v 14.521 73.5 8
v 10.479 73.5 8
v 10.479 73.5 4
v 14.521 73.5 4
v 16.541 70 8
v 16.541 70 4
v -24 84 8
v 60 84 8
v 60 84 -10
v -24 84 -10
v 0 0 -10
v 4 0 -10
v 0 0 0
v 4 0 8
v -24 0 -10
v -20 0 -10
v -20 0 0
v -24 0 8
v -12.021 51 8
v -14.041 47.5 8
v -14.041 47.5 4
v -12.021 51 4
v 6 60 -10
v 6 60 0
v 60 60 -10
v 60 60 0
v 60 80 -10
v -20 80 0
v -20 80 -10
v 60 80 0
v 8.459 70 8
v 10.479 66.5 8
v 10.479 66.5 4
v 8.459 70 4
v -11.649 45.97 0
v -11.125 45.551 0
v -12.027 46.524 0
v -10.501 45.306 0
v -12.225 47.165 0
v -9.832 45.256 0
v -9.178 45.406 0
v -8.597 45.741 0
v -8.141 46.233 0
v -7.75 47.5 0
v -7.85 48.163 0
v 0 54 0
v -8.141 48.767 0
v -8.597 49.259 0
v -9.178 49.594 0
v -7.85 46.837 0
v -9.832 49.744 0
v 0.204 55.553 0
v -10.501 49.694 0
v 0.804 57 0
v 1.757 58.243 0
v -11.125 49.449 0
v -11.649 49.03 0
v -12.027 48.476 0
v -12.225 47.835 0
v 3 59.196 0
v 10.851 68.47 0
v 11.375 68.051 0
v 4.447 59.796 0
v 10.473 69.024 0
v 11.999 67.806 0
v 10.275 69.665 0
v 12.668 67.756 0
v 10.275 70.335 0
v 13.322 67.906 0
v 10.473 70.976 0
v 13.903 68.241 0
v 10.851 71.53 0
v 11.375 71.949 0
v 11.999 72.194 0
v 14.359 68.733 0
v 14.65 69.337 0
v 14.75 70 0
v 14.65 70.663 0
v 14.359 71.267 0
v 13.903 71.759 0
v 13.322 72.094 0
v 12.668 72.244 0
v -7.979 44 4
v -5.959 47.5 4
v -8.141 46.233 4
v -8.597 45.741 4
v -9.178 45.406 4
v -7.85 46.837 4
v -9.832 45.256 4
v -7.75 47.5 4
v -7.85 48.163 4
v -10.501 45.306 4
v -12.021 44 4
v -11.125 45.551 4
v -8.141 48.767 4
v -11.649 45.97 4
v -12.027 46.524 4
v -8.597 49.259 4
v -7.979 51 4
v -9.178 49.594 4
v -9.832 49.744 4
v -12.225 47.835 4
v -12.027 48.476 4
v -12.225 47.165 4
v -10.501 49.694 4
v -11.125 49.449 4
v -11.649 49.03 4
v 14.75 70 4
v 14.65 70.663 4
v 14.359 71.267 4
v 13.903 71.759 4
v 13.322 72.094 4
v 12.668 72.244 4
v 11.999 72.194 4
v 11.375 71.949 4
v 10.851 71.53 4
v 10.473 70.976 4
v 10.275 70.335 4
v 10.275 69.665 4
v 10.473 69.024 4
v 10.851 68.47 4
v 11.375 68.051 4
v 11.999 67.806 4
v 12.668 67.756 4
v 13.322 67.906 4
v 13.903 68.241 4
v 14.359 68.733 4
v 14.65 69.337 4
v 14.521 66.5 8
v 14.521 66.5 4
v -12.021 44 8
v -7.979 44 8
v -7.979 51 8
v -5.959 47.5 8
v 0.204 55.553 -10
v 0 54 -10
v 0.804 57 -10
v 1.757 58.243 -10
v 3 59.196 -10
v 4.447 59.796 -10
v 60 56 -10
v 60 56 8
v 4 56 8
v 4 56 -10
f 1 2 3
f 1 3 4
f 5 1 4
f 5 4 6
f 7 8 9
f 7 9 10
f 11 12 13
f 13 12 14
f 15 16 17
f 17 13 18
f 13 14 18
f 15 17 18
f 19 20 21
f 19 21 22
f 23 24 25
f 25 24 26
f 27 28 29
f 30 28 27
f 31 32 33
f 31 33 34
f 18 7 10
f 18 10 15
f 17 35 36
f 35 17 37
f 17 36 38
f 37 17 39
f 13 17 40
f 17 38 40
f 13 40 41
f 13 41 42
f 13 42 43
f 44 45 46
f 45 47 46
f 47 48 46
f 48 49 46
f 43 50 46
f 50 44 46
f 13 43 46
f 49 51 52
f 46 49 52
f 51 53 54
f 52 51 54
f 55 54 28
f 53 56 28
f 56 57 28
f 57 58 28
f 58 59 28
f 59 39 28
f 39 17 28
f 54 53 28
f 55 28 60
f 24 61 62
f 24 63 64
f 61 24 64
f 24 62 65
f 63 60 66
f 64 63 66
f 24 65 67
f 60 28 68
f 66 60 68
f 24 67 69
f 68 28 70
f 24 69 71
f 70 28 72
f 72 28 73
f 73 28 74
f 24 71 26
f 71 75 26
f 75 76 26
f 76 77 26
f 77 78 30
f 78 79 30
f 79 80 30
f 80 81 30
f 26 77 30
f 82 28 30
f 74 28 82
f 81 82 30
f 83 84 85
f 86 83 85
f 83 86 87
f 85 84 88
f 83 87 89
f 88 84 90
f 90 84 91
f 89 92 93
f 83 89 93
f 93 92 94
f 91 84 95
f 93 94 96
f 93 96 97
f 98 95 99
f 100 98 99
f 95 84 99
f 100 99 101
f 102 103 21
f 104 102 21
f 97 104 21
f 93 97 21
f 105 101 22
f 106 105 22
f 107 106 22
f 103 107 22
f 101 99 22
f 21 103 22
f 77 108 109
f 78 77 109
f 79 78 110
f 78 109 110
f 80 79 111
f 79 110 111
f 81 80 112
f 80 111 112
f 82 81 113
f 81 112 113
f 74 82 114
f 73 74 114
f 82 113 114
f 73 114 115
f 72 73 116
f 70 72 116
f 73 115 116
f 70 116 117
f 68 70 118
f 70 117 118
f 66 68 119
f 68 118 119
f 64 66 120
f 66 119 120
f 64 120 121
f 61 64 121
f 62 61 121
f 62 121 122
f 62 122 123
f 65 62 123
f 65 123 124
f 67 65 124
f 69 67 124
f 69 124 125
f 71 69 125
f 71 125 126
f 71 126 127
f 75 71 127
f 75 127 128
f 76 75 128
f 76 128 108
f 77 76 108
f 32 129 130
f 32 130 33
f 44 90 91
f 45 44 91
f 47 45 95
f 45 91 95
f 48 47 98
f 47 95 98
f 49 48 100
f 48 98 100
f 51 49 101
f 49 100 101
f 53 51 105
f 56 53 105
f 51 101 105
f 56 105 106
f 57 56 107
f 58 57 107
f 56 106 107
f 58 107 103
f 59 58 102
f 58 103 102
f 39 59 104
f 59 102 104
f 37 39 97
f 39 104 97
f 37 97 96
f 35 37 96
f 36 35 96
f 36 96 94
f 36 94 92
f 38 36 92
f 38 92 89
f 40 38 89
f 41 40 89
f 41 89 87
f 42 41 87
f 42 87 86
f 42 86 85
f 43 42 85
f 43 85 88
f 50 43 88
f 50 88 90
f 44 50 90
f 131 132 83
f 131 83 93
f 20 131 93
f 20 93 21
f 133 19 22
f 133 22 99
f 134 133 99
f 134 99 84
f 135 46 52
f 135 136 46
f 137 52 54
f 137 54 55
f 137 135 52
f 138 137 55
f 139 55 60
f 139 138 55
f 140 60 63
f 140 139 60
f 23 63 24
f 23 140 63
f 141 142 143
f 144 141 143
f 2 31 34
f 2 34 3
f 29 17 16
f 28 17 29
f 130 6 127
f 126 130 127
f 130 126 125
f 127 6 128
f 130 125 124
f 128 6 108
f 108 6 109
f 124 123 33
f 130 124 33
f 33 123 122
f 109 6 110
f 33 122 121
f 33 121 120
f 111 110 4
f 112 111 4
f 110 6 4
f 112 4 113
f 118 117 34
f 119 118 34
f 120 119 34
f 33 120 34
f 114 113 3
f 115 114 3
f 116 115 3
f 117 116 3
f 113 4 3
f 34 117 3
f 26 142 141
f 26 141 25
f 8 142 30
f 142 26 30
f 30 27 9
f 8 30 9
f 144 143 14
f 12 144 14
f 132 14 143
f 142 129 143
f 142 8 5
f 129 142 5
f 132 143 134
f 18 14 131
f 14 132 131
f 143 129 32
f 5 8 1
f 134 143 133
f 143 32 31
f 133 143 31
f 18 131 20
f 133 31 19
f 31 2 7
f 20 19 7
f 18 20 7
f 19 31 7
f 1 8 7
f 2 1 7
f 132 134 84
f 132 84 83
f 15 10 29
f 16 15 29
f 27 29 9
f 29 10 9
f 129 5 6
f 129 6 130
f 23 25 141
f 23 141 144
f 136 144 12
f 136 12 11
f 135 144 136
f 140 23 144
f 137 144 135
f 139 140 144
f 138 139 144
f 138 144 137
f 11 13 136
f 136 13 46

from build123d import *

# Parameters (mm, degrees)
BOSS_EXTRU_1_DEPTH      = 8
ENL_V_MAT_EXTRU_1_DEPTH = 4
ESQUISSE3_R             = 2.25
ENL_V_MAT_EXTRU_2_DEPTH = 5
BOSS_EXTRU_2_DEPTH      = 18
CONG_1_R                = 6


with BuildPart() as part:
    # Esquisse1 → Boss.-Extru.1 (new body)
    with BuildSketch(Plane.XY):
        Polygon((0, 0), (0, 60), (60, 60), (60, 80), (-20, 80), (-20, 0), align=None)
    extrude(amount=BOSS_EXTRU_1_DEPTH)

    # Esquisse2 → Enlèv. mat.-Extru.1 (cut)
    with BuildSketch(Plane.XY.offset(8)):
        Polygon((-14.041451884, 47.5), (-12.020725942, 51), (-7.979274058, 51), (-5.958548116, 47.5), (-7.979274058, 44), (-12.020725942, 44), align=None)
        Polygon((8.458548116, 70), (10.479274058, 73.5), (14.520725942, 73.5), (16.541451884, 70), (14.520725942, 66.5), (10.479274058, 66.5), align=None)
    extrude(amount=-ENL_V_MAT_EXTRU_1_DEPTH, mode=Mode.SUBTRACT)

    # Esquisse3 → Enlèv. mat.-Extru.2 (cut, through all)
    with BuildSketch(Plane.XY.offset(4)):
        with Locations((-10, 47.5)):
            Circle(ESQUISSE3_R)
        with Locations((12.5, 70)):
            Circle(ESQUISSE3_R)
    extrude(amount=-ENL_V_MAT_EXTRU_2_DEPTH, mode=Mode.SUBTRACT)

    # Esquisse4 → Boss.-Extru.2 (add)
    with BuildSketch(Plane.XY.offset(8)):
        Polygon((0, 0), (0, 60), (60, 60), (60, 56), (4, 56), (4, 0), align=None)
        Polygon((60, 80), (60, 84), (-24, 84), (-24, 0), (-20, 0), (-20, 80), align=None)
    extrude(amount=-BOSS_EXTRU_2_DEPTH)

    # Congé1
    cong_1_edges = [part.edges().sort_by_distance(p)[0] for p in [
        (0, 60, -5),
    ]]
    fillet(cong_1_edges, radius=CONG_1_R)


solid = part.part
